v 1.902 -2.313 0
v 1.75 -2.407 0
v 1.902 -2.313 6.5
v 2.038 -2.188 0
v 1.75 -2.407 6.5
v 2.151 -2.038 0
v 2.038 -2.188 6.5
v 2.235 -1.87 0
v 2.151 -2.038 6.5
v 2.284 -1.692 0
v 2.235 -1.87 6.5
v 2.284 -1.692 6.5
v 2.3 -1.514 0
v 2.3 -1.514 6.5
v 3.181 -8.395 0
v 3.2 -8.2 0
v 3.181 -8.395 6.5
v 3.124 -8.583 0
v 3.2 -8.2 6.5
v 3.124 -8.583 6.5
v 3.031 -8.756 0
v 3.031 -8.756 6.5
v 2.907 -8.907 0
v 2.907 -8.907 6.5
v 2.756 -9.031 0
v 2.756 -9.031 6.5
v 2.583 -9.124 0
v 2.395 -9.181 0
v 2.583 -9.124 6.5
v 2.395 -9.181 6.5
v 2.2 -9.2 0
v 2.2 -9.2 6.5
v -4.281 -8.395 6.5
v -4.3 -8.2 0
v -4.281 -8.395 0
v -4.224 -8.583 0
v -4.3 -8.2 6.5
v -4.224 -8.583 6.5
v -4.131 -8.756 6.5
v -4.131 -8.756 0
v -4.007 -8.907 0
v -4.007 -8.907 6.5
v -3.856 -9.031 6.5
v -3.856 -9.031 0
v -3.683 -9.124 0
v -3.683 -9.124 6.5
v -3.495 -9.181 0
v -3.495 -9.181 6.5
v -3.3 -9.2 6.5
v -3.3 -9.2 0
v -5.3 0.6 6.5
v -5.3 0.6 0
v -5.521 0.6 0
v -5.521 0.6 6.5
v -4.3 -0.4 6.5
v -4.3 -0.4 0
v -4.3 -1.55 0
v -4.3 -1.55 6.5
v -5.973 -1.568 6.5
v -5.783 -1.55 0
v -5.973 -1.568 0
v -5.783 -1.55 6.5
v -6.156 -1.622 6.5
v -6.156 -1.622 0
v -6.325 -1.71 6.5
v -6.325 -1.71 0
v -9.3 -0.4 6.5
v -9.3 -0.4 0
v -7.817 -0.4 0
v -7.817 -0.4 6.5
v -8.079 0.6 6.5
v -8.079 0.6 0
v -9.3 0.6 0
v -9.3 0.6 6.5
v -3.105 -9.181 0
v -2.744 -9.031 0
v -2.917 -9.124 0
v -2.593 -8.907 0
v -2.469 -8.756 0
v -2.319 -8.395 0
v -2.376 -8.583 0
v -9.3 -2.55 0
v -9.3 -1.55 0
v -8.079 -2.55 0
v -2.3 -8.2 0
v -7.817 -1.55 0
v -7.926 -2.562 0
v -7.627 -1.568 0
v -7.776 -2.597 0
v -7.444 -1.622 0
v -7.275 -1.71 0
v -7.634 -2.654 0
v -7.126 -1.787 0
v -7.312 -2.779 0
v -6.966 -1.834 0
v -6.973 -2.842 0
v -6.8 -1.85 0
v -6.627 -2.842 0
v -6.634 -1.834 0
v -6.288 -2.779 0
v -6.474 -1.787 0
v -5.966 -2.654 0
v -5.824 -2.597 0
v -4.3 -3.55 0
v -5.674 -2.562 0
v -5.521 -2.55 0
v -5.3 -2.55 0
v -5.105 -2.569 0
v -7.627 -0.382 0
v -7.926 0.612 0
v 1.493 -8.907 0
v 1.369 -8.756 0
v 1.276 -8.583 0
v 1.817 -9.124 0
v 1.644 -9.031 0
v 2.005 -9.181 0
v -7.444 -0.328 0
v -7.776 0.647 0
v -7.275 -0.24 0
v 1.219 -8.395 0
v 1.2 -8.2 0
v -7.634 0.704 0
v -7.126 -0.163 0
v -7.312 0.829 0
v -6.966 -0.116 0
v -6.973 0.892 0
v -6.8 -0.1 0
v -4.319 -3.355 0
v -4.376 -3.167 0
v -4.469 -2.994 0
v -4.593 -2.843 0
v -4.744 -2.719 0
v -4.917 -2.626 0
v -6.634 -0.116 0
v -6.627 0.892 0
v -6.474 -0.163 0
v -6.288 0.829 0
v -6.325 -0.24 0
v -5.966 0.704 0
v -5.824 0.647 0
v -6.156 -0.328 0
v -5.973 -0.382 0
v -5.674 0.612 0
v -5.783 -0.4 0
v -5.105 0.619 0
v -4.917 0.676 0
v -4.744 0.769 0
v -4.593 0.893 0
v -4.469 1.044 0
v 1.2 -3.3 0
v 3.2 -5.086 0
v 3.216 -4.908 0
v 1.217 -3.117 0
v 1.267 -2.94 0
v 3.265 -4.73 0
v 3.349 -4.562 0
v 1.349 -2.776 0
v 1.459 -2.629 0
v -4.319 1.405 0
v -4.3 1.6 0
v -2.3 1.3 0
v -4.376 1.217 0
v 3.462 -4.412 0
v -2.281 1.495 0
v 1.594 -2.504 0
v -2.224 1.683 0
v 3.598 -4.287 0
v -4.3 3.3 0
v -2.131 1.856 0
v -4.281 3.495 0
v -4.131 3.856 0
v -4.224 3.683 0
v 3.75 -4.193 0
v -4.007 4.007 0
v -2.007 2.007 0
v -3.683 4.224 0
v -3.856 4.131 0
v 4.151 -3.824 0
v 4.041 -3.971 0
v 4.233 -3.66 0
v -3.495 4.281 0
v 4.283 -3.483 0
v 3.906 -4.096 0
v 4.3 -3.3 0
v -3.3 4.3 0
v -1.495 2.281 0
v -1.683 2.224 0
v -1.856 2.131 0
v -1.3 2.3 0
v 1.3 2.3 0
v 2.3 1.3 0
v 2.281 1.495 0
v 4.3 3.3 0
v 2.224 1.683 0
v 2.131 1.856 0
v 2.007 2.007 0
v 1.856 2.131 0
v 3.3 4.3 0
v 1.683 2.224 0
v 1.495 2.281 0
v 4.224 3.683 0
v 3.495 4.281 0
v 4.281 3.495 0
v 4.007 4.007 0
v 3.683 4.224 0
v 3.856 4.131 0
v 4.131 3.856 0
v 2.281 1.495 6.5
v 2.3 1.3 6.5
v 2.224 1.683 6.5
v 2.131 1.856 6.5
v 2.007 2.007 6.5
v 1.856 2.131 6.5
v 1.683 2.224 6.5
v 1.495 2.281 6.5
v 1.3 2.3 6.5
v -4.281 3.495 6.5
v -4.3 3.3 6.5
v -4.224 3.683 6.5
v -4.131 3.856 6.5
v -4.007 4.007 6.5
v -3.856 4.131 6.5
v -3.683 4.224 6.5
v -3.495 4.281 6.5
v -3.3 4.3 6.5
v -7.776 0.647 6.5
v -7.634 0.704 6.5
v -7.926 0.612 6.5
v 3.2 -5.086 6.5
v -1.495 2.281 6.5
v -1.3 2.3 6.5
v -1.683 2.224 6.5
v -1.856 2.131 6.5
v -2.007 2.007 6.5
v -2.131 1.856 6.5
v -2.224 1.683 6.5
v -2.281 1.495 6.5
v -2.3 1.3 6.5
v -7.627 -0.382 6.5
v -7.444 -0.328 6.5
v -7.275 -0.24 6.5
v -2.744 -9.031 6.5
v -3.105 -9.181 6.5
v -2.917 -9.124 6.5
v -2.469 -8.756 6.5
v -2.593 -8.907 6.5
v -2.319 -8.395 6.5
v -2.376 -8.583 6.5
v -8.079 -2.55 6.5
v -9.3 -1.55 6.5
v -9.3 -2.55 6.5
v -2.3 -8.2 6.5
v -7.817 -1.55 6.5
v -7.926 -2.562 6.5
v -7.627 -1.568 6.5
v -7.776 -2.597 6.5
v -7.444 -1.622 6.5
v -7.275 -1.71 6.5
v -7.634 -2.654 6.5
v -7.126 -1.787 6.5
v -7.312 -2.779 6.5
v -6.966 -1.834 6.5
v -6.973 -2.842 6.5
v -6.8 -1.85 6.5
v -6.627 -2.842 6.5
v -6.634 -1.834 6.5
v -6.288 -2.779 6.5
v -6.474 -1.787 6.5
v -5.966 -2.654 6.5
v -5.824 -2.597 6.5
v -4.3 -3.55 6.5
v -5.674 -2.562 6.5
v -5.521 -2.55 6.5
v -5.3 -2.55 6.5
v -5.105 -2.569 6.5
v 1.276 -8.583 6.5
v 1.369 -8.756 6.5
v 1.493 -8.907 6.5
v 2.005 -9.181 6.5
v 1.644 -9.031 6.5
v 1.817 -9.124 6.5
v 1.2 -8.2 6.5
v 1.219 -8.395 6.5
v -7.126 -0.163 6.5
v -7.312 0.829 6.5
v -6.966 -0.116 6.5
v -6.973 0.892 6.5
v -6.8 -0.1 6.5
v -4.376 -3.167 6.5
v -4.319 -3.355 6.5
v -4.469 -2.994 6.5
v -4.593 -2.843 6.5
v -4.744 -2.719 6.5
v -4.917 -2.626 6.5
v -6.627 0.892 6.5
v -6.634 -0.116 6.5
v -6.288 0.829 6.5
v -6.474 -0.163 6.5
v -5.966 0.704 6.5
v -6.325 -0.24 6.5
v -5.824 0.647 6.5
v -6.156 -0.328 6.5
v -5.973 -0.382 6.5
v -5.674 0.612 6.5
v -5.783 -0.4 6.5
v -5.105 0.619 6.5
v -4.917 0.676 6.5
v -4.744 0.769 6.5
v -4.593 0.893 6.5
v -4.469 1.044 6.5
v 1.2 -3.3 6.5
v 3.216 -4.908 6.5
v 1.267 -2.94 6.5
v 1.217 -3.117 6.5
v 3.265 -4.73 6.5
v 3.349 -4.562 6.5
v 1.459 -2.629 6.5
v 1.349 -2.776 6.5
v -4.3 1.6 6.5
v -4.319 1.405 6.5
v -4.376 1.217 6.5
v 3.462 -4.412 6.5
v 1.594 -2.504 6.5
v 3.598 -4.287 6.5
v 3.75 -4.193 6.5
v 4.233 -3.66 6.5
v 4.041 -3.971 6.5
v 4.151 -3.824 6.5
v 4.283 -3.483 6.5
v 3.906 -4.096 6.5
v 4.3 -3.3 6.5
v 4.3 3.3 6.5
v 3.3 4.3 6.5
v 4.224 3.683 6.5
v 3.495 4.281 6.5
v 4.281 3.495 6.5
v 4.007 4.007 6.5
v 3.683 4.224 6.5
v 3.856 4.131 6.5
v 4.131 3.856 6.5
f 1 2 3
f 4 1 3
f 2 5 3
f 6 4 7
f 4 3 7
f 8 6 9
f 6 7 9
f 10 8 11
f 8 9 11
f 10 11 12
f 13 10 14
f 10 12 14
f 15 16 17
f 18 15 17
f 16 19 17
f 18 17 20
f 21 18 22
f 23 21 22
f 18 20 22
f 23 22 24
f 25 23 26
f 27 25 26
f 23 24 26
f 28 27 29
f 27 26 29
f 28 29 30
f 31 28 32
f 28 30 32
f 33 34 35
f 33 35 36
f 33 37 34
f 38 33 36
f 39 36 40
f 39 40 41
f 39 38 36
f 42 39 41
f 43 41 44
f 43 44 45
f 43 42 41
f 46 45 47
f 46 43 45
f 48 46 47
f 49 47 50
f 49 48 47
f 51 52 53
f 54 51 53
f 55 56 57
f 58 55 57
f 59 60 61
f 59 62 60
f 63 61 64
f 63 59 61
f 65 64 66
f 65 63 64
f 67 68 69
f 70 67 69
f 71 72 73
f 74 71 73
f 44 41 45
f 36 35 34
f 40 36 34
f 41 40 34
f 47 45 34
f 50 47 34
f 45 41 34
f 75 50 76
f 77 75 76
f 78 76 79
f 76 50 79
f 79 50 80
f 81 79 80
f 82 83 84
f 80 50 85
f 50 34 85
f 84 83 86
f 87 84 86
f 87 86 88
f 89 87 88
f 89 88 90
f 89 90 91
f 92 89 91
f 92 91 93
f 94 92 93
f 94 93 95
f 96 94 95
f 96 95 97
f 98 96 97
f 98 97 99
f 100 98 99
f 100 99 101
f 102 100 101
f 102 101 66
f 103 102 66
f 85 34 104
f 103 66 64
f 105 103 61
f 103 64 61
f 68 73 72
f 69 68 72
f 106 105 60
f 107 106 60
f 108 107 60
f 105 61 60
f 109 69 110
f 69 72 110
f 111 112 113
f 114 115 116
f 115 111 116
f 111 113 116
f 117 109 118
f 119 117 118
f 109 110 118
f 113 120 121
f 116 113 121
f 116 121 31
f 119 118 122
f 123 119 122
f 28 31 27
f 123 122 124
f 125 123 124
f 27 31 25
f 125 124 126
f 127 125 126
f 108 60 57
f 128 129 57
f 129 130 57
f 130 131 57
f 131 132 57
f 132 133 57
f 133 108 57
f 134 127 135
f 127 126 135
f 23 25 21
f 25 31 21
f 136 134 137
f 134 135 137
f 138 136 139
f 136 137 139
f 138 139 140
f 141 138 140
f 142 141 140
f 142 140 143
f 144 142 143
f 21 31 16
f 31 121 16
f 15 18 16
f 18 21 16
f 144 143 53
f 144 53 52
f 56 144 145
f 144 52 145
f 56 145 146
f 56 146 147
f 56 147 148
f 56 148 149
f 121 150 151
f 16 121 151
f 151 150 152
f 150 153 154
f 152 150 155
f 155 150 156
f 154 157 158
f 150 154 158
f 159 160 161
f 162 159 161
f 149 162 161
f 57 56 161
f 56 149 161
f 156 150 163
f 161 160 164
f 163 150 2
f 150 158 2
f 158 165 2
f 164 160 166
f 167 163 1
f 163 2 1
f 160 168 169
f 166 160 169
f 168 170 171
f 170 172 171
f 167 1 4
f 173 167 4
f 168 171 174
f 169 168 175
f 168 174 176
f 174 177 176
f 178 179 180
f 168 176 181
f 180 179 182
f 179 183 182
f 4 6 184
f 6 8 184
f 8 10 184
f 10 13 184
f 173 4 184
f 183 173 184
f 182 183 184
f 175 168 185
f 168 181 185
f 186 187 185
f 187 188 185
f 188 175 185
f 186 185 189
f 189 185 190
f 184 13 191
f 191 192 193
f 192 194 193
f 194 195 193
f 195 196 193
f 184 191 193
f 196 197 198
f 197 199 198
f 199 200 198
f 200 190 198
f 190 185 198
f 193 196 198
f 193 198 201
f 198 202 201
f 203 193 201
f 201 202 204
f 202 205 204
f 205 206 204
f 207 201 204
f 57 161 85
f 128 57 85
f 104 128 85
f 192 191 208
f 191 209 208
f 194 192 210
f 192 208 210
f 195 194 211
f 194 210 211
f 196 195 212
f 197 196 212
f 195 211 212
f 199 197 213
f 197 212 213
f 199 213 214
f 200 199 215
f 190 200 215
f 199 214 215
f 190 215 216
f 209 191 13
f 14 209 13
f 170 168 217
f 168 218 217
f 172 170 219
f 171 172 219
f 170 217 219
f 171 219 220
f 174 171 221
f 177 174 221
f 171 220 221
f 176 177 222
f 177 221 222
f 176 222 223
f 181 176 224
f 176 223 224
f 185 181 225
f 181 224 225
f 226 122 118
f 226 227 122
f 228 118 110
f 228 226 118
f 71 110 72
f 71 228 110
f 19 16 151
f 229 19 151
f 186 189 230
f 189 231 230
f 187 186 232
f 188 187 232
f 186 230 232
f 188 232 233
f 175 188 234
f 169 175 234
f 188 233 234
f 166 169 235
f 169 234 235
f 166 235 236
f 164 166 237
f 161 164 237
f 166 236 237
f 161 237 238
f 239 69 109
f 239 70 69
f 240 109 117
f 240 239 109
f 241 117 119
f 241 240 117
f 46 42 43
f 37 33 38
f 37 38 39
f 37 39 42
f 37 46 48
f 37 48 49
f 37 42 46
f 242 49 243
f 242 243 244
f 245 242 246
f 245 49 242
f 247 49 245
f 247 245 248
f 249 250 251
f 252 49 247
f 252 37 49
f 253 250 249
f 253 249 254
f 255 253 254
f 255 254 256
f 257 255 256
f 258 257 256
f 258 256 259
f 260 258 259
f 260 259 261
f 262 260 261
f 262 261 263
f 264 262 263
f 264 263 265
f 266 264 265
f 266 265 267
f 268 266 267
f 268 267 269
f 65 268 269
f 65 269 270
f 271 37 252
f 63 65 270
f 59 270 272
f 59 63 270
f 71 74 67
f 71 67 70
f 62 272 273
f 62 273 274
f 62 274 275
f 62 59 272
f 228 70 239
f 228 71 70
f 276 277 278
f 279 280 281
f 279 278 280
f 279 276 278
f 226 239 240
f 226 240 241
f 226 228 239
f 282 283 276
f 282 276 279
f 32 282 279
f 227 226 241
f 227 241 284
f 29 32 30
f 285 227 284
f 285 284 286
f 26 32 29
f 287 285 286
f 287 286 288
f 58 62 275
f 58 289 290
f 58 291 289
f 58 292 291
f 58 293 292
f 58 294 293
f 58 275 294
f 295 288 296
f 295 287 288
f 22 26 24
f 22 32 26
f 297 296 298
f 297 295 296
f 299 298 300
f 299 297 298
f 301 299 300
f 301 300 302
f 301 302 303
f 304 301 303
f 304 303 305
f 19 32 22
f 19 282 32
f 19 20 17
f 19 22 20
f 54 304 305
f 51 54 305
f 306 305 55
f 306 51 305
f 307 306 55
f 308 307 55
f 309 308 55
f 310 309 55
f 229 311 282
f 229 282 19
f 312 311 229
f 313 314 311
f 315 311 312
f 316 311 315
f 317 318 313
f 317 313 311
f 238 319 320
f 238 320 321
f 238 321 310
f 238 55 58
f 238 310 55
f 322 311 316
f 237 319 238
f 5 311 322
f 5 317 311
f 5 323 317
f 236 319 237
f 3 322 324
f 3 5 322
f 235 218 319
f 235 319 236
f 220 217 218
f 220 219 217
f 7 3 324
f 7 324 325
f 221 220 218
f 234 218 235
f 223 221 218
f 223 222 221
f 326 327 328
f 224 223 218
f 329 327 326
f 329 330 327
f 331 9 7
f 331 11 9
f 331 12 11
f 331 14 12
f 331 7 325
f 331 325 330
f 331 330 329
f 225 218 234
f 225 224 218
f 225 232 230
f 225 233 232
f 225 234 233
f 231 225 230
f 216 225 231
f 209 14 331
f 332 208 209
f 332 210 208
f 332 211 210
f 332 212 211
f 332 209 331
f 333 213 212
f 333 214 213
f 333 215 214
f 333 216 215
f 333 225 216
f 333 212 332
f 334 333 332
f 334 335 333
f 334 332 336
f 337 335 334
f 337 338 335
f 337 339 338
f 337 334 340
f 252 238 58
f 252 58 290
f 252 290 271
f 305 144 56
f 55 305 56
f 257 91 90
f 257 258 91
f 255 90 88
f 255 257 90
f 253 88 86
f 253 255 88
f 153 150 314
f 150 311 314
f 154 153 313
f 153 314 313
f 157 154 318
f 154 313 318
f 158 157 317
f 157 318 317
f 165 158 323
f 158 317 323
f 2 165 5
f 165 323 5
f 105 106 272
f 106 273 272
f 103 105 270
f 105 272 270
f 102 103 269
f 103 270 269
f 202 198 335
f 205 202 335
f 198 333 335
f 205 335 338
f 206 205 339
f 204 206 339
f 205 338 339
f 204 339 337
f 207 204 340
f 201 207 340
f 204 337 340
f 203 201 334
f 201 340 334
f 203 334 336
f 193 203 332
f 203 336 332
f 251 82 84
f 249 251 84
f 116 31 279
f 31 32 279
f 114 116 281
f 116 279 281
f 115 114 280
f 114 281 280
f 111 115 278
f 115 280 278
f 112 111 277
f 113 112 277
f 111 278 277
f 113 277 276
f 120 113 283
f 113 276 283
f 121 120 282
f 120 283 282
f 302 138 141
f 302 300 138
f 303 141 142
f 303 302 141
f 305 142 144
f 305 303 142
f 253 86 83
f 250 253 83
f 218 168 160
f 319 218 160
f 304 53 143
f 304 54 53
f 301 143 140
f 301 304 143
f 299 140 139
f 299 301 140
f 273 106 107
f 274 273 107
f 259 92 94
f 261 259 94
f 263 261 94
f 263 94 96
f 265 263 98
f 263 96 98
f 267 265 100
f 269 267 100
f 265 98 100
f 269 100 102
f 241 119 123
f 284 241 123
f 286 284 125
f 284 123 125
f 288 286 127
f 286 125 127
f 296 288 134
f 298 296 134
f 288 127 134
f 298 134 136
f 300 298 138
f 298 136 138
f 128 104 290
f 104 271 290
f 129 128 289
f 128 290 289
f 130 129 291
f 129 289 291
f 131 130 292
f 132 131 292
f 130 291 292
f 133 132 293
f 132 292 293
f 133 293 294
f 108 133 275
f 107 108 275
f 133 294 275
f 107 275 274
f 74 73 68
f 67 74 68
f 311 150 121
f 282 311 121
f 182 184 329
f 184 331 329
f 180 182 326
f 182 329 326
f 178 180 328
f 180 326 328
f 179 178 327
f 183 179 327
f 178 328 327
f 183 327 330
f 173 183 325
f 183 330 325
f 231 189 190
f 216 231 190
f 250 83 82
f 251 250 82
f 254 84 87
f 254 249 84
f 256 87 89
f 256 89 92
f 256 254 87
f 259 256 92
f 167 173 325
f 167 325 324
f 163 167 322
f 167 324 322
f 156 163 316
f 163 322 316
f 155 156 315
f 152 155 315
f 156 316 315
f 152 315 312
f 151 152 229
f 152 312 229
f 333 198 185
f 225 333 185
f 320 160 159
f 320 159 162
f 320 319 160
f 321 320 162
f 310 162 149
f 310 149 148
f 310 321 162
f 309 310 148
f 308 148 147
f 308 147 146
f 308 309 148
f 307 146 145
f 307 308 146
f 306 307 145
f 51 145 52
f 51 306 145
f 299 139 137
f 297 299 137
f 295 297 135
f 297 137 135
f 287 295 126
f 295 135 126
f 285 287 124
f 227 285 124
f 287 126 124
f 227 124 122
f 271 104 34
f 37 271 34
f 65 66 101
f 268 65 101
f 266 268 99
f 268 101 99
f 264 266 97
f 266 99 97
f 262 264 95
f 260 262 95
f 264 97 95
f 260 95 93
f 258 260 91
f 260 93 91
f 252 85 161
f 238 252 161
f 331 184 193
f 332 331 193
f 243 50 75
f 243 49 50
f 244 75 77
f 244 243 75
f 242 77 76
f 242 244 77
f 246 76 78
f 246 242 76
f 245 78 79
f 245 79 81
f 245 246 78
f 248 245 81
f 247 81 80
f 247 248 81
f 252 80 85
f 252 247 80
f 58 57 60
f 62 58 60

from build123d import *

# Parameters (mm, degrees)
F1_DEPTH = 6.5
F2_R     = 1
F3_R     = 1
F4_R     = 0.99999
F5_R     = 1


# Not quite as in the source:
# - a fillet or chamfer is up to 0.001 mm smaller than in the source, because OpenCascade refuses the exact size


with BuildPart() as f1:
    # F0 (on Top) → F1 (new body)
    with BuildSketch(Plane.XY):
        Polygon((-2.3, 2.3), (2.3, 2.3), (2.3, -2.3), (1.2, -2.3), (1.2, -9.2), (3.2, -9.2), (3.2, -4.3), (4.3, -4.3), (4.3, 4.3), (-4.3, 4.3), (-4.3, 0.6), (-4.3, -0.4), (-4.3, -1.55), (-4.3, -2.3), (-4.3, -2.55), (-4.3, -9.2), (-2.3, -9.2), (-2.3, -2.3), align=None)
        with BuildLine():
            Line((-5.7826505025, -2.55), (-4.3, -2.55))
            Line((-4.3, -2.55), (-4.3, -2.3))
            Line((-4.3, -2.3), (-4.3, -1.55))
            Line((-4.3, -1.55), (-6.1404547021, -1.55))
            ThreePointArc((-6.1404547021, -1.55), (-6.8, -1.85), (-7.4595452979, -1.55))
            Line((-7.4595452979, -1.55), (-9.3, -1.55))
            Line((-9.3, -1.55), (-9.3, -2.55))
            Line((-9.3, -2.55), (-7.8173494975, -2.55))
            Line((-7.8173494975, -2.55), (-5.7826505025, -2.55))
        make_face()
        with BuildLine():
            ThreePointArc((-7.8173494975, -2.55), (-6.8, -2.85), (-5.7826505025, -2.55))
            Line((-5.7826505025, -2.55), (-7.8173494975, -2.55))
        make_face()
        with BuildLine():
            Line((-6.1404547021, -0.4), (-4.3, -0.4))
            Line((-4.3, -0.4), (-4.3, 0.6))
            Line((-4.3, 0.6), (-5.7826505025, 0.6))
            ThreePointArc((-5.7826505025, 0.6), (-6.8, 0.9), (-7.8173494975, 0.6))
            Line((-7.8173494975, 0.6), (-9.3, 0.6))
            Line((-9.3, 0.6), (-9.3, -0.4))
            Line((-9.3, -0.4), (-7.4595452979, -0.4))
            ThreePointArc((-7.4595452979, -0.4), (-6.8, -0.1), (-6.1404547021, -0.4))
        make_face()
    extrude(amount=F1_DEPTH)

    # F2
    f2_edges = [f1.edges().sort_by_distance(p)[0] for p in [
        (-7.817349, -2.55, 3.25),
        (-7.817349, 0.6, 3.25),
        (-5.782651, 0.6, 3.25),
    ]]
    fillet(f2_edges, radius=F2_R)

    # F3
    f3_edges = [f1.edges().sort_by_distance(p)[0] for p in [
        (-6.140455, -1.55, 3.25),
        (-7.459545, -1.55, 3.25),
        (-7.459545, -0.4, 3.25),
        (-6.140455, -0.4, 3.25),
    ]]
    fillet(f3_edges, radius=F3_R)

    # F4 (radius 1 in the source; OpenCascade refuses exactly that, so slightly less here)
    f4_edges = [f1.edges().sort_by_distance(p)[0] for p in [
        (-4.3, -9.2, 3.25),
        (-2.3, -9.2, 3.25),
        (1.2, -9.2, 3.25),
        (3.2, -9.2, 3.25),
        (-4.3, 4.3, 3.25),
        (4.3, -4.3, 3.25),
        (4.3, 4.3, 3.25),
        (1.2, -2.3, 3.25),
    ]]
    fillet(f4_edges, radius=F4_R)

    # F5
    f5_edges = [f1.edges().sort_by_distance(p)[0] for p in [
        (-2.3, 2.3, 3.25),
        (2.3, 2.3, 3.25),
        (2.3, -2.3, 3.25),
        (3.2, -4.3, 3.25),
        (-4.3, 0.6, 3.25),
        (-4.3, -2.55, 3.25),
        (-5.782651, -2.55, 3.25),
    ]]
    fillet(f5_edges, radius=F5_R)


solid = f1.part
